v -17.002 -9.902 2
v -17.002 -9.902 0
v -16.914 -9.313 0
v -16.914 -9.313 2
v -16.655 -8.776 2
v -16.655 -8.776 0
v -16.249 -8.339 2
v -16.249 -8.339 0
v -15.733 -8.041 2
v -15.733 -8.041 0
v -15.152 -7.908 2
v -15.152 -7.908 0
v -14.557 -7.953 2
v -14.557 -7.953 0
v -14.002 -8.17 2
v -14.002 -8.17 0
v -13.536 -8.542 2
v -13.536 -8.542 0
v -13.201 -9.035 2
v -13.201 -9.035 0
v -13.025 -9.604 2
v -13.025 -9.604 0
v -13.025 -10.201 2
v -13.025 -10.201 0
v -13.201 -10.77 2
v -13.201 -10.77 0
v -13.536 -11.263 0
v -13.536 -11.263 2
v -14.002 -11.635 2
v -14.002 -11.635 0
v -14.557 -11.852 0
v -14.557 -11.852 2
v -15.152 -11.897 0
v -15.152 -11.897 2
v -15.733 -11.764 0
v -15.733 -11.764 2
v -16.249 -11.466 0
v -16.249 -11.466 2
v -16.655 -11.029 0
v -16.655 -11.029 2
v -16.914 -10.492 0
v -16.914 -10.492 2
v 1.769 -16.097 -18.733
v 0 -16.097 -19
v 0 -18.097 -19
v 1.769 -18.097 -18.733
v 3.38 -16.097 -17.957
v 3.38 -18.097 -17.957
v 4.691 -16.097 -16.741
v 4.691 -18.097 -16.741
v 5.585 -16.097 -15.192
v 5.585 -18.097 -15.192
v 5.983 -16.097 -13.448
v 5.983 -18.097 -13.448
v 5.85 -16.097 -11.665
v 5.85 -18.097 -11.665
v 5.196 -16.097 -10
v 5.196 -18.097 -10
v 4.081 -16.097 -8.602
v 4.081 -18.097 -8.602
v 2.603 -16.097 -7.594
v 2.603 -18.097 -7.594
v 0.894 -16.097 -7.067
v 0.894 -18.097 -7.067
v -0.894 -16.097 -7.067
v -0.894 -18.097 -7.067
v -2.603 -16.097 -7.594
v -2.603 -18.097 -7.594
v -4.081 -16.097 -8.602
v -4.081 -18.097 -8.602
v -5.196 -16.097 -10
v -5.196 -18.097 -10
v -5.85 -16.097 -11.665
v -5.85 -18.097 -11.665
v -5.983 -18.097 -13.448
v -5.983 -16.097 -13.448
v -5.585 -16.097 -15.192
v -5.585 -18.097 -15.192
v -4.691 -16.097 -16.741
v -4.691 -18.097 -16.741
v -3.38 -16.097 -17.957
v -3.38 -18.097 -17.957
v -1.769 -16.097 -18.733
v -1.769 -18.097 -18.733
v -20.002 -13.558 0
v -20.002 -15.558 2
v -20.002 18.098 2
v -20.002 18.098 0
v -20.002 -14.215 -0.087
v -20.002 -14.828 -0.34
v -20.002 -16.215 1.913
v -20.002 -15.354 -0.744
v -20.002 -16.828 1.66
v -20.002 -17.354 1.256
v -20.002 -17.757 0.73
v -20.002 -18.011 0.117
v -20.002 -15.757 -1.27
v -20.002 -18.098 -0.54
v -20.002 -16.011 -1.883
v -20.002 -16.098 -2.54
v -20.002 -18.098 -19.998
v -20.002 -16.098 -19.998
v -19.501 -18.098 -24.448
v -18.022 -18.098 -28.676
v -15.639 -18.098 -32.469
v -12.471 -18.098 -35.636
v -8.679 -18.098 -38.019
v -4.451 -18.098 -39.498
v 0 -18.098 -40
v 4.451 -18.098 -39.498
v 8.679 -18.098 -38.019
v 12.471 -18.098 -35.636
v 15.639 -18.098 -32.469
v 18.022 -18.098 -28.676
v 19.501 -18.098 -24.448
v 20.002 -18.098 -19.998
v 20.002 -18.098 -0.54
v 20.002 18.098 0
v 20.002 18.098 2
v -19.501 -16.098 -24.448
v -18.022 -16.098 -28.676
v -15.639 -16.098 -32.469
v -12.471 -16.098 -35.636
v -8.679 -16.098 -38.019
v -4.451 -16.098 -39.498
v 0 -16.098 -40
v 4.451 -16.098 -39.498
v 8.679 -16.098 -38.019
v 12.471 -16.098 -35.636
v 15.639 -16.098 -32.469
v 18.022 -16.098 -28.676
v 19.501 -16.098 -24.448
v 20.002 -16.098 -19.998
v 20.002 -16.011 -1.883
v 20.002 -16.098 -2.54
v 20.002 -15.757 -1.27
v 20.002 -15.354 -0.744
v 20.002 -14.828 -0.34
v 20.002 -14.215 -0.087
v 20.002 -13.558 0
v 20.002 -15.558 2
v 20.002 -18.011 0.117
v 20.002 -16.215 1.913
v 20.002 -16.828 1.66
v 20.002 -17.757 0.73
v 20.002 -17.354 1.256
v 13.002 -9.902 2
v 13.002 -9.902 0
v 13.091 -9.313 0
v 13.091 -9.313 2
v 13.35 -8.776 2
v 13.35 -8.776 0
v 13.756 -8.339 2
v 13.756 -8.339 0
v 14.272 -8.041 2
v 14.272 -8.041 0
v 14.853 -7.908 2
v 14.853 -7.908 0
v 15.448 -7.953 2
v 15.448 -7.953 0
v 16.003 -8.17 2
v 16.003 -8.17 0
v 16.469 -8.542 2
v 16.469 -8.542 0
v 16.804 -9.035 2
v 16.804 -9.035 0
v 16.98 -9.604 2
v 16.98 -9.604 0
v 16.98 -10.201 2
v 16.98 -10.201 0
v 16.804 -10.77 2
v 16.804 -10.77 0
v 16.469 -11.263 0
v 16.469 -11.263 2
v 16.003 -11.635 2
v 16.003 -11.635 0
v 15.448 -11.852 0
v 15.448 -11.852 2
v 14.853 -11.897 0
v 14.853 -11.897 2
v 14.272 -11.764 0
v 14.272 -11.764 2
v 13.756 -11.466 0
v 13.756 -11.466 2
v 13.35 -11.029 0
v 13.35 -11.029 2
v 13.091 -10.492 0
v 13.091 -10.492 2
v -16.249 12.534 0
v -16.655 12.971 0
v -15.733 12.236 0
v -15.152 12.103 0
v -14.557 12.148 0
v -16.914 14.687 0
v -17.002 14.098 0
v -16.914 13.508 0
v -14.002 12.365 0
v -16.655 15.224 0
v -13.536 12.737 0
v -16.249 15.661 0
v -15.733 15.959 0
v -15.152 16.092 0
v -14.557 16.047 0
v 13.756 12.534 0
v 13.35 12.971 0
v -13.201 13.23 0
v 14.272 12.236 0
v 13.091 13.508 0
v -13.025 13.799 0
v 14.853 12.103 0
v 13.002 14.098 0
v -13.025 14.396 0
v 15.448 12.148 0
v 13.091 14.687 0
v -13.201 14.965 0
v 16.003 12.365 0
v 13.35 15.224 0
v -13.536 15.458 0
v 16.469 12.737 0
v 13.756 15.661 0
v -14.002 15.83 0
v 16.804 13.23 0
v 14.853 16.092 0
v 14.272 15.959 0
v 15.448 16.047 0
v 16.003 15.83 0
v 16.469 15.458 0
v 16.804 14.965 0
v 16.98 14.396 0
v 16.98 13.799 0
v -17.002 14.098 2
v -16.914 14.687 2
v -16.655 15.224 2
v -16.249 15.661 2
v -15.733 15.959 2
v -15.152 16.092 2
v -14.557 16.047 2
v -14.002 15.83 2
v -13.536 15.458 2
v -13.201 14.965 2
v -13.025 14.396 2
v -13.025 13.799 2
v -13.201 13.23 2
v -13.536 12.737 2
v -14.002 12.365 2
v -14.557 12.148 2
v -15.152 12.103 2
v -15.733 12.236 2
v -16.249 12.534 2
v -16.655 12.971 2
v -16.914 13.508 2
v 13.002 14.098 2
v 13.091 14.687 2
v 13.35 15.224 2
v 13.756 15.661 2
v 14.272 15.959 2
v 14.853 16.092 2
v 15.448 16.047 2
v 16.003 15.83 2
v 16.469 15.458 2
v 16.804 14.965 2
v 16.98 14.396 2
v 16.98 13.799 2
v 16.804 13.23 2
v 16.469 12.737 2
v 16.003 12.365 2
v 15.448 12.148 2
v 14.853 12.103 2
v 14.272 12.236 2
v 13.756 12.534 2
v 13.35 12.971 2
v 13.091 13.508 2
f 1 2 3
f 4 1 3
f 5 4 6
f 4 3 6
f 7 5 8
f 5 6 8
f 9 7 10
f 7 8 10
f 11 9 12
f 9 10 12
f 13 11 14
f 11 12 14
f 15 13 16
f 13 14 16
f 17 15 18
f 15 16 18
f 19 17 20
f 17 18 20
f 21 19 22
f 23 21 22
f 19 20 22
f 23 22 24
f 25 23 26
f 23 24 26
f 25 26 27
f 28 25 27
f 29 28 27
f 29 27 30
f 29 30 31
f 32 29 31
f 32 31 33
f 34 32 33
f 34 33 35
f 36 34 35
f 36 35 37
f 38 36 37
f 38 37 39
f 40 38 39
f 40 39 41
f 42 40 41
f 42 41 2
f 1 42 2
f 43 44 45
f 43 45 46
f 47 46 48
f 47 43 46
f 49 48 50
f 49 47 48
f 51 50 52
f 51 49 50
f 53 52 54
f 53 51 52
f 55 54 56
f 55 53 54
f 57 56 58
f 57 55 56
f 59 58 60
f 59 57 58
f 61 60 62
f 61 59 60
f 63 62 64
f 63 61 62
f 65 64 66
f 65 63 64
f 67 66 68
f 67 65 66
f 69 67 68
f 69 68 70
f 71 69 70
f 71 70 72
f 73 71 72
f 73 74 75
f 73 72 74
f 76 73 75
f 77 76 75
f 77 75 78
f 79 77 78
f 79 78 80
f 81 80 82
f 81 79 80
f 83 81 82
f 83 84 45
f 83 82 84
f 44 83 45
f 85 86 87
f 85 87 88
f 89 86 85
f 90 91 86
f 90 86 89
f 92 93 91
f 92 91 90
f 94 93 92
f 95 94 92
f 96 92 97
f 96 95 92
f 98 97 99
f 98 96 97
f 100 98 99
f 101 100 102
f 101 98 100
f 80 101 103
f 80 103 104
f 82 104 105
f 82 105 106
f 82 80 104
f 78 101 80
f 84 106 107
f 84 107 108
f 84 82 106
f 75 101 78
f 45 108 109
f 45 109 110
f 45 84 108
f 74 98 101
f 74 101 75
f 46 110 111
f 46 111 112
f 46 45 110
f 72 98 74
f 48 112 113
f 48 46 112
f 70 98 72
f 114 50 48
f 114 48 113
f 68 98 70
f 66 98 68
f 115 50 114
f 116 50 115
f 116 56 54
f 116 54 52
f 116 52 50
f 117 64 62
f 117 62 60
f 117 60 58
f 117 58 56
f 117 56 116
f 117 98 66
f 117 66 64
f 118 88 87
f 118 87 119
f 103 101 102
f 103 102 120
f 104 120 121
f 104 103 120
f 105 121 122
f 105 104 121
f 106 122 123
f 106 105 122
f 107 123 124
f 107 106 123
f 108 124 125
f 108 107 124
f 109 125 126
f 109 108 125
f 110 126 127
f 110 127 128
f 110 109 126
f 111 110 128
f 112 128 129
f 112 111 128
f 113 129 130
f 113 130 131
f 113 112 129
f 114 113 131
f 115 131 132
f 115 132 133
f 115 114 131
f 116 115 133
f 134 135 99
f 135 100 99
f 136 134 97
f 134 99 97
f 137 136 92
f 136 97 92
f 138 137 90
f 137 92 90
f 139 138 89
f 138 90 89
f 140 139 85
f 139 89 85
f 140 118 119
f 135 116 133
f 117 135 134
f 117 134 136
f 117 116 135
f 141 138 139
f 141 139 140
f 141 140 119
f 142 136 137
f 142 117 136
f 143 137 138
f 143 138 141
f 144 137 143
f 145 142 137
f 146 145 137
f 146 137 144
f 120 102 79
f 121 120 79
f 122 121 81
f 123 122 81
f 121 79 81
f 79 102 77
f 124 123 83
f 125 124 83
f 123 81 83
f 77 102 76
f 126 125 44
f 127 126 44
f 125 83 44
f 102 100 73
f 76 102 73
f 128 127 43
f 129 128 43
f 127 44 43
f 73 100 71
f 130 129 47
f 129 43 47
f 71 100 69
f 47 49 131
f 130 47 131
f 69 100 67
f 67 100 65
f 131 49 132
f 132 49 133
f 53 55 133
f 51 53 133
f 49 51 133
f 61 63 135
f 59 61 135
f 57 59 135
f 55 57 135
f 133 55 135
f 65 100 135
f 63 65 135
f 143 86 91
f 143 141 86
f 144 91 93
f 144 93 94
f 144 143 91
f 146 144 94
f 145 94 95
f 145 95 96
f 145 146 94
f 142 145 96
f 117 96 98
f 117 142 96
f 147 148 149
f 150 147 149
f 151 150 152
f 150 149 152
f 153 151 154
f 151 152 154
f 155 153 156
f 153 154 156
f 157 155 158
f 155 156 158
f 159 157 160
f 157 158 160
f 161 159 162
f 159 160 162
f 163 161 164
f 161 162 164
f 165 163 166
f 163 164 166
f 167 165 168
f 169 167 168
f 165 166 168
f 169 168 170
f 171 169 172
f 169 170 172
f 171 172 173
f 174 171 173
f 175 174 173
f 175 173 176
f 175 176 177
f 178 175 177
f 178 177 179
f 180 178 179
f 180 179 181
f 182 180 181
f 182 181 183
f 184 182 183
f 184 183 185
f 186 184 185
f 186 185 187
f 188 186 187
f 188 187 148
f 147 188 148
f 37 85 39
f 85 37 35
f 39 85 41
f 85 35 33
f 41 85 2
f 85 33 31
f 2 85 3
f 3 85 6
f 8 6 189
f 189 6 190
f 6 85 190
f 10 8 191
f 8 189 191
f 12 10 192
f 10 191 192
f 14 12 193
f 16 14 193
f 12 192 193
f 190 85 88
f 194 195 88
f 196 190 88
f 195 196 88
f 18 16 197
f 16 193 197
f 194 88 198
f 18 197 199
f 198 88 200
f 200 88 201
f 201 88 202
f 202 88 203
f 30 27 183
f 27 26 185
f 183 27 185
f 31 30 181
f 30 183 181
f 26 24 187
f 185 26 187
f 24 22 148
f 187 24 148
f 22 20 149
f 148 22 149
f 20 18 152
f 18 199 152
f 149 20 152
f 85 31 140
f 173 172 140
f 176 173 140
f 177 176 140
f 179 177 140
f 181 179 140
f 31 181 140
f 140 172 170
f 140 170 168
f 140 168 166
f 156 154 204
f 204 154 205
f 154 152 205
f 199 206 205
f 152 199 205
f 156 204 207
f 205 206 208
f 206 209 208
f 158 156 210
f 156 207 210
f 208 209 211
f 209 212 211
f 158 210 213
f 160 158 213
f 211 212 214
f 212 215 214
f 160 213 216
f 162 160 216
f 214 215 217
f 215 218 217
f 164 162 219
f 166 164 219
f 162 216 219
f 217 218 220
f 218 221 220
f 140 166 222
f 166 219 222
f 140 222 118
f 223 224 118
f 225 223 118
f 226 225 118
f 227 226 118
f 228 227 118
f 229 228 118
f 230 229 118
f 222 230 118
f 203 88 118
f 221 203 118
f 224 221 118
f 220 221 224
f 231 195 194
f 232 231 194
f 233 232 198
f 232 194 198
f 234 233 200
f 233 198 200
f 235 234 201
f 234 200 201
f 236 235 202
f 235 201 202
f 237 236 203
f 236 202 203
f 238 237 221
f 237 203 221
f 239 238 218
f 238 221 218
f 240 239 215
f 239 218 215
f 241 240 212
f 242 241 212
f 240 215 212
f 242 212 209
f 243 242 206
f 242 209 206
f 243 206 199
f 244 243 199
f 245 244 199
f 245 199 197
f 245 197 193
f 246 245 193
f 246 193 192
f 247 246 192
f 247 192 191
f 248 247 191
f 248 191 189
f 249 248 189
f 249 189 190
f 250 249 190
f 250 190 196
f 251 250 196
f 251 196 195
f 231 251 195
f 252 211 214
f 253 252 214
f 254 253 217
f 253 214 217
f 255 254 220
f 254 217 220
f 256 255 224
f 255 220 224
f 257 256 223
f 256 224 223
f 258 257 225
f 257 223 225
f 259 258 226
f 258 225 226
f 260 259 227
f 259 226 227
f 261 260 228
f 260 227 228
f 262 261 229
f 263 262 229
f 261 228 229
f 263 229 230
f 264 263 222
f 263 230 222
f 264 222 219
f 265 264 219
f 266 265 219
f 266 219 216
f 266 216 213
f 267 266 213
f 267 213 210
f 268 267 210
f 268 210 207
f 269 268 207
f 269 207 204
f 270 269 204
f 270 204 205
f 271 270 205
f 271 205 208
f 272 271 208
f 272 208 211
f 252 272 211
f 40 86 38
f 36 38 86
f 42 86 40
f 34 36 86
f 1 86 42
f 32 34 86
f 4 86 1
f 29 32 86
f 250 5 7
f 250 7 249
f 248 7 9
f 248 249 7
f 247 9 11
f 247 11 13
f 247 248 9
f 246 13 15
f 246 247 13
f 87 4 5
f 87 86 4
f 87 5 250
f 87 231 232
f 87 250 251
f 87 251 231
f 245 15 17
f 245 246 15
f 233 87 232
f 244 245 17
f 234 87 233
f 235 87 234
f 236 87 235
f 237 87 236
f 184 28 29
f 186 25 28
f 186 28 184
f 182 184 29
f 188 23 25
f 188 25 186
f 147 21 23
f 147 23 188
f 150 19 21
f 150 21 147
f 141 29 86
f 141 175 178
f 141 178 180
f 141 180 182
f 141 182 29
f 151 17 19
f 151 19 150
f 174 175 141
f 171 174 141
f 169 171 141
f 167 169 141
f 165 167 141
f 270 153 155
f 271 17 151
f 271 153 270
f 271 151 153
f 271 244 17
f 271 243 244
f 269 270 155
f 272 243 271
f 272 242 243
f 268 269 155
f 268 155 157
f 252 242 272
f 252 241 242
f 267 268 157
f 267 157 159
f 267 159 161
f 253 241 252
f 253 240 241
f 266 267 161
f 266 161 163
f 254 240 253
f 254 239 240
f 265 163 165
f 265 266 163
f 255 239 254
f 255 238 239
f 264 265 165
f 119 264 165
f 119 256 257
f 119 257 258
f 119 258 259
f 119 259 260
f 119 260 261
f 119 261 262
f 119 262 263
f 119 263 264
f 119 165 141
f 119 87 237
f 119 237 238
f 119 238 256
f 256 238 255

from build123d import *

# Parameters (mm, degrees)
SKETCH1_W               = 40.005
SKETCH1_H               = 36.195
BOSS_EXTRUDE1_DEPTH     = 2
BOSS_EXTRUDE3_DEPTH     = 2
FILLET1_R               = 2.54
SKETCH4_R               = 2
CUT_EXTRUDE1_DEPTH      = 49.245409238
CUT_EXTRUDE2_DEPTH      = 58.534146654
CUT_EXTRUDE2_DEPTH_BACK = 58.534146654
SKETCH5_R               = 6


with BuildPart() as part:
    # Sketch1 → Boss-Extrude1 (new body)
    with BuildSketch(Plane.XY):
        Rectangle(SKETCH1_W, SKETCH1_H)
    extrude(amount=BOSS_EXTRUDE1_DEPTH)

    # Sketch3 → Boss-Extrude3 (add)
    with BuildSketch(Plane.XZ.offset(18.0975)):
        with BuildLine():
            Line((20.0025, 0), (-20.0025, 0))
            Line((-20.0025, 0), (-20.0025, -19.9975))
            ThreePointArc((-20.0025, -19.9975), (0, -40), (20.0025, -19.9975))
            Line((20.0025, -19.9975), (20.0025, 0))
        make_face()
    extrude(amount=-BOSS_EXTRUDE3_DEPTH)

    # Fillet1
    fillet1_edges = [part.edges().sort_by_distance(p)[0] for p in [
        (0, -16.0975, 0),
        (0, -18.0975, 2),
    ]]
    fillet(fillet1_edges, radius=FILLET1_R)

    # Sketch4 → Cut-Extrude1 (cut, through all)
    with BuildSketch(Plane(origin=(0, 0, 0), x_dir=(-1, 0, 0), z_dir=(0, 0, -1))):
        with Locations((-15.0025, 14.0975)):
            Circle(SKETCH4_R)
        with Locations((15.0025, 14.0975)):
            Circle(SKETCH4_R)
        with Locations((15.0025, -9.9025)):
            Circle(SKETCH4_R)
        with Locations((-15.0025, -9.9025)):
            Circle(SKETCH4_R)
    extrude(amount=-CUT_EXTRUDE1_DEPTH, mode=Mode.SUBTRACT)

    # Sketch5 → Cut-Extrude2 (cut, two sides: drawn at the far end of the back side and taken through both)
    with BuildSketch(Plane.XZ.offset(18.0975).offset(-CUT_EXTRUDE2_DEPTH_BACK)):
        with Locations(Location((0, -13, 0), (0, 0, 270))):
            Circle(SKETCH5_R)
    extrude(amount=CUT_EXTRUDE2_DEPTH + CUT_EXTRUDE2_DEPTH_BACK, mode=Mode.SUBTRACT)


solid = part.part
